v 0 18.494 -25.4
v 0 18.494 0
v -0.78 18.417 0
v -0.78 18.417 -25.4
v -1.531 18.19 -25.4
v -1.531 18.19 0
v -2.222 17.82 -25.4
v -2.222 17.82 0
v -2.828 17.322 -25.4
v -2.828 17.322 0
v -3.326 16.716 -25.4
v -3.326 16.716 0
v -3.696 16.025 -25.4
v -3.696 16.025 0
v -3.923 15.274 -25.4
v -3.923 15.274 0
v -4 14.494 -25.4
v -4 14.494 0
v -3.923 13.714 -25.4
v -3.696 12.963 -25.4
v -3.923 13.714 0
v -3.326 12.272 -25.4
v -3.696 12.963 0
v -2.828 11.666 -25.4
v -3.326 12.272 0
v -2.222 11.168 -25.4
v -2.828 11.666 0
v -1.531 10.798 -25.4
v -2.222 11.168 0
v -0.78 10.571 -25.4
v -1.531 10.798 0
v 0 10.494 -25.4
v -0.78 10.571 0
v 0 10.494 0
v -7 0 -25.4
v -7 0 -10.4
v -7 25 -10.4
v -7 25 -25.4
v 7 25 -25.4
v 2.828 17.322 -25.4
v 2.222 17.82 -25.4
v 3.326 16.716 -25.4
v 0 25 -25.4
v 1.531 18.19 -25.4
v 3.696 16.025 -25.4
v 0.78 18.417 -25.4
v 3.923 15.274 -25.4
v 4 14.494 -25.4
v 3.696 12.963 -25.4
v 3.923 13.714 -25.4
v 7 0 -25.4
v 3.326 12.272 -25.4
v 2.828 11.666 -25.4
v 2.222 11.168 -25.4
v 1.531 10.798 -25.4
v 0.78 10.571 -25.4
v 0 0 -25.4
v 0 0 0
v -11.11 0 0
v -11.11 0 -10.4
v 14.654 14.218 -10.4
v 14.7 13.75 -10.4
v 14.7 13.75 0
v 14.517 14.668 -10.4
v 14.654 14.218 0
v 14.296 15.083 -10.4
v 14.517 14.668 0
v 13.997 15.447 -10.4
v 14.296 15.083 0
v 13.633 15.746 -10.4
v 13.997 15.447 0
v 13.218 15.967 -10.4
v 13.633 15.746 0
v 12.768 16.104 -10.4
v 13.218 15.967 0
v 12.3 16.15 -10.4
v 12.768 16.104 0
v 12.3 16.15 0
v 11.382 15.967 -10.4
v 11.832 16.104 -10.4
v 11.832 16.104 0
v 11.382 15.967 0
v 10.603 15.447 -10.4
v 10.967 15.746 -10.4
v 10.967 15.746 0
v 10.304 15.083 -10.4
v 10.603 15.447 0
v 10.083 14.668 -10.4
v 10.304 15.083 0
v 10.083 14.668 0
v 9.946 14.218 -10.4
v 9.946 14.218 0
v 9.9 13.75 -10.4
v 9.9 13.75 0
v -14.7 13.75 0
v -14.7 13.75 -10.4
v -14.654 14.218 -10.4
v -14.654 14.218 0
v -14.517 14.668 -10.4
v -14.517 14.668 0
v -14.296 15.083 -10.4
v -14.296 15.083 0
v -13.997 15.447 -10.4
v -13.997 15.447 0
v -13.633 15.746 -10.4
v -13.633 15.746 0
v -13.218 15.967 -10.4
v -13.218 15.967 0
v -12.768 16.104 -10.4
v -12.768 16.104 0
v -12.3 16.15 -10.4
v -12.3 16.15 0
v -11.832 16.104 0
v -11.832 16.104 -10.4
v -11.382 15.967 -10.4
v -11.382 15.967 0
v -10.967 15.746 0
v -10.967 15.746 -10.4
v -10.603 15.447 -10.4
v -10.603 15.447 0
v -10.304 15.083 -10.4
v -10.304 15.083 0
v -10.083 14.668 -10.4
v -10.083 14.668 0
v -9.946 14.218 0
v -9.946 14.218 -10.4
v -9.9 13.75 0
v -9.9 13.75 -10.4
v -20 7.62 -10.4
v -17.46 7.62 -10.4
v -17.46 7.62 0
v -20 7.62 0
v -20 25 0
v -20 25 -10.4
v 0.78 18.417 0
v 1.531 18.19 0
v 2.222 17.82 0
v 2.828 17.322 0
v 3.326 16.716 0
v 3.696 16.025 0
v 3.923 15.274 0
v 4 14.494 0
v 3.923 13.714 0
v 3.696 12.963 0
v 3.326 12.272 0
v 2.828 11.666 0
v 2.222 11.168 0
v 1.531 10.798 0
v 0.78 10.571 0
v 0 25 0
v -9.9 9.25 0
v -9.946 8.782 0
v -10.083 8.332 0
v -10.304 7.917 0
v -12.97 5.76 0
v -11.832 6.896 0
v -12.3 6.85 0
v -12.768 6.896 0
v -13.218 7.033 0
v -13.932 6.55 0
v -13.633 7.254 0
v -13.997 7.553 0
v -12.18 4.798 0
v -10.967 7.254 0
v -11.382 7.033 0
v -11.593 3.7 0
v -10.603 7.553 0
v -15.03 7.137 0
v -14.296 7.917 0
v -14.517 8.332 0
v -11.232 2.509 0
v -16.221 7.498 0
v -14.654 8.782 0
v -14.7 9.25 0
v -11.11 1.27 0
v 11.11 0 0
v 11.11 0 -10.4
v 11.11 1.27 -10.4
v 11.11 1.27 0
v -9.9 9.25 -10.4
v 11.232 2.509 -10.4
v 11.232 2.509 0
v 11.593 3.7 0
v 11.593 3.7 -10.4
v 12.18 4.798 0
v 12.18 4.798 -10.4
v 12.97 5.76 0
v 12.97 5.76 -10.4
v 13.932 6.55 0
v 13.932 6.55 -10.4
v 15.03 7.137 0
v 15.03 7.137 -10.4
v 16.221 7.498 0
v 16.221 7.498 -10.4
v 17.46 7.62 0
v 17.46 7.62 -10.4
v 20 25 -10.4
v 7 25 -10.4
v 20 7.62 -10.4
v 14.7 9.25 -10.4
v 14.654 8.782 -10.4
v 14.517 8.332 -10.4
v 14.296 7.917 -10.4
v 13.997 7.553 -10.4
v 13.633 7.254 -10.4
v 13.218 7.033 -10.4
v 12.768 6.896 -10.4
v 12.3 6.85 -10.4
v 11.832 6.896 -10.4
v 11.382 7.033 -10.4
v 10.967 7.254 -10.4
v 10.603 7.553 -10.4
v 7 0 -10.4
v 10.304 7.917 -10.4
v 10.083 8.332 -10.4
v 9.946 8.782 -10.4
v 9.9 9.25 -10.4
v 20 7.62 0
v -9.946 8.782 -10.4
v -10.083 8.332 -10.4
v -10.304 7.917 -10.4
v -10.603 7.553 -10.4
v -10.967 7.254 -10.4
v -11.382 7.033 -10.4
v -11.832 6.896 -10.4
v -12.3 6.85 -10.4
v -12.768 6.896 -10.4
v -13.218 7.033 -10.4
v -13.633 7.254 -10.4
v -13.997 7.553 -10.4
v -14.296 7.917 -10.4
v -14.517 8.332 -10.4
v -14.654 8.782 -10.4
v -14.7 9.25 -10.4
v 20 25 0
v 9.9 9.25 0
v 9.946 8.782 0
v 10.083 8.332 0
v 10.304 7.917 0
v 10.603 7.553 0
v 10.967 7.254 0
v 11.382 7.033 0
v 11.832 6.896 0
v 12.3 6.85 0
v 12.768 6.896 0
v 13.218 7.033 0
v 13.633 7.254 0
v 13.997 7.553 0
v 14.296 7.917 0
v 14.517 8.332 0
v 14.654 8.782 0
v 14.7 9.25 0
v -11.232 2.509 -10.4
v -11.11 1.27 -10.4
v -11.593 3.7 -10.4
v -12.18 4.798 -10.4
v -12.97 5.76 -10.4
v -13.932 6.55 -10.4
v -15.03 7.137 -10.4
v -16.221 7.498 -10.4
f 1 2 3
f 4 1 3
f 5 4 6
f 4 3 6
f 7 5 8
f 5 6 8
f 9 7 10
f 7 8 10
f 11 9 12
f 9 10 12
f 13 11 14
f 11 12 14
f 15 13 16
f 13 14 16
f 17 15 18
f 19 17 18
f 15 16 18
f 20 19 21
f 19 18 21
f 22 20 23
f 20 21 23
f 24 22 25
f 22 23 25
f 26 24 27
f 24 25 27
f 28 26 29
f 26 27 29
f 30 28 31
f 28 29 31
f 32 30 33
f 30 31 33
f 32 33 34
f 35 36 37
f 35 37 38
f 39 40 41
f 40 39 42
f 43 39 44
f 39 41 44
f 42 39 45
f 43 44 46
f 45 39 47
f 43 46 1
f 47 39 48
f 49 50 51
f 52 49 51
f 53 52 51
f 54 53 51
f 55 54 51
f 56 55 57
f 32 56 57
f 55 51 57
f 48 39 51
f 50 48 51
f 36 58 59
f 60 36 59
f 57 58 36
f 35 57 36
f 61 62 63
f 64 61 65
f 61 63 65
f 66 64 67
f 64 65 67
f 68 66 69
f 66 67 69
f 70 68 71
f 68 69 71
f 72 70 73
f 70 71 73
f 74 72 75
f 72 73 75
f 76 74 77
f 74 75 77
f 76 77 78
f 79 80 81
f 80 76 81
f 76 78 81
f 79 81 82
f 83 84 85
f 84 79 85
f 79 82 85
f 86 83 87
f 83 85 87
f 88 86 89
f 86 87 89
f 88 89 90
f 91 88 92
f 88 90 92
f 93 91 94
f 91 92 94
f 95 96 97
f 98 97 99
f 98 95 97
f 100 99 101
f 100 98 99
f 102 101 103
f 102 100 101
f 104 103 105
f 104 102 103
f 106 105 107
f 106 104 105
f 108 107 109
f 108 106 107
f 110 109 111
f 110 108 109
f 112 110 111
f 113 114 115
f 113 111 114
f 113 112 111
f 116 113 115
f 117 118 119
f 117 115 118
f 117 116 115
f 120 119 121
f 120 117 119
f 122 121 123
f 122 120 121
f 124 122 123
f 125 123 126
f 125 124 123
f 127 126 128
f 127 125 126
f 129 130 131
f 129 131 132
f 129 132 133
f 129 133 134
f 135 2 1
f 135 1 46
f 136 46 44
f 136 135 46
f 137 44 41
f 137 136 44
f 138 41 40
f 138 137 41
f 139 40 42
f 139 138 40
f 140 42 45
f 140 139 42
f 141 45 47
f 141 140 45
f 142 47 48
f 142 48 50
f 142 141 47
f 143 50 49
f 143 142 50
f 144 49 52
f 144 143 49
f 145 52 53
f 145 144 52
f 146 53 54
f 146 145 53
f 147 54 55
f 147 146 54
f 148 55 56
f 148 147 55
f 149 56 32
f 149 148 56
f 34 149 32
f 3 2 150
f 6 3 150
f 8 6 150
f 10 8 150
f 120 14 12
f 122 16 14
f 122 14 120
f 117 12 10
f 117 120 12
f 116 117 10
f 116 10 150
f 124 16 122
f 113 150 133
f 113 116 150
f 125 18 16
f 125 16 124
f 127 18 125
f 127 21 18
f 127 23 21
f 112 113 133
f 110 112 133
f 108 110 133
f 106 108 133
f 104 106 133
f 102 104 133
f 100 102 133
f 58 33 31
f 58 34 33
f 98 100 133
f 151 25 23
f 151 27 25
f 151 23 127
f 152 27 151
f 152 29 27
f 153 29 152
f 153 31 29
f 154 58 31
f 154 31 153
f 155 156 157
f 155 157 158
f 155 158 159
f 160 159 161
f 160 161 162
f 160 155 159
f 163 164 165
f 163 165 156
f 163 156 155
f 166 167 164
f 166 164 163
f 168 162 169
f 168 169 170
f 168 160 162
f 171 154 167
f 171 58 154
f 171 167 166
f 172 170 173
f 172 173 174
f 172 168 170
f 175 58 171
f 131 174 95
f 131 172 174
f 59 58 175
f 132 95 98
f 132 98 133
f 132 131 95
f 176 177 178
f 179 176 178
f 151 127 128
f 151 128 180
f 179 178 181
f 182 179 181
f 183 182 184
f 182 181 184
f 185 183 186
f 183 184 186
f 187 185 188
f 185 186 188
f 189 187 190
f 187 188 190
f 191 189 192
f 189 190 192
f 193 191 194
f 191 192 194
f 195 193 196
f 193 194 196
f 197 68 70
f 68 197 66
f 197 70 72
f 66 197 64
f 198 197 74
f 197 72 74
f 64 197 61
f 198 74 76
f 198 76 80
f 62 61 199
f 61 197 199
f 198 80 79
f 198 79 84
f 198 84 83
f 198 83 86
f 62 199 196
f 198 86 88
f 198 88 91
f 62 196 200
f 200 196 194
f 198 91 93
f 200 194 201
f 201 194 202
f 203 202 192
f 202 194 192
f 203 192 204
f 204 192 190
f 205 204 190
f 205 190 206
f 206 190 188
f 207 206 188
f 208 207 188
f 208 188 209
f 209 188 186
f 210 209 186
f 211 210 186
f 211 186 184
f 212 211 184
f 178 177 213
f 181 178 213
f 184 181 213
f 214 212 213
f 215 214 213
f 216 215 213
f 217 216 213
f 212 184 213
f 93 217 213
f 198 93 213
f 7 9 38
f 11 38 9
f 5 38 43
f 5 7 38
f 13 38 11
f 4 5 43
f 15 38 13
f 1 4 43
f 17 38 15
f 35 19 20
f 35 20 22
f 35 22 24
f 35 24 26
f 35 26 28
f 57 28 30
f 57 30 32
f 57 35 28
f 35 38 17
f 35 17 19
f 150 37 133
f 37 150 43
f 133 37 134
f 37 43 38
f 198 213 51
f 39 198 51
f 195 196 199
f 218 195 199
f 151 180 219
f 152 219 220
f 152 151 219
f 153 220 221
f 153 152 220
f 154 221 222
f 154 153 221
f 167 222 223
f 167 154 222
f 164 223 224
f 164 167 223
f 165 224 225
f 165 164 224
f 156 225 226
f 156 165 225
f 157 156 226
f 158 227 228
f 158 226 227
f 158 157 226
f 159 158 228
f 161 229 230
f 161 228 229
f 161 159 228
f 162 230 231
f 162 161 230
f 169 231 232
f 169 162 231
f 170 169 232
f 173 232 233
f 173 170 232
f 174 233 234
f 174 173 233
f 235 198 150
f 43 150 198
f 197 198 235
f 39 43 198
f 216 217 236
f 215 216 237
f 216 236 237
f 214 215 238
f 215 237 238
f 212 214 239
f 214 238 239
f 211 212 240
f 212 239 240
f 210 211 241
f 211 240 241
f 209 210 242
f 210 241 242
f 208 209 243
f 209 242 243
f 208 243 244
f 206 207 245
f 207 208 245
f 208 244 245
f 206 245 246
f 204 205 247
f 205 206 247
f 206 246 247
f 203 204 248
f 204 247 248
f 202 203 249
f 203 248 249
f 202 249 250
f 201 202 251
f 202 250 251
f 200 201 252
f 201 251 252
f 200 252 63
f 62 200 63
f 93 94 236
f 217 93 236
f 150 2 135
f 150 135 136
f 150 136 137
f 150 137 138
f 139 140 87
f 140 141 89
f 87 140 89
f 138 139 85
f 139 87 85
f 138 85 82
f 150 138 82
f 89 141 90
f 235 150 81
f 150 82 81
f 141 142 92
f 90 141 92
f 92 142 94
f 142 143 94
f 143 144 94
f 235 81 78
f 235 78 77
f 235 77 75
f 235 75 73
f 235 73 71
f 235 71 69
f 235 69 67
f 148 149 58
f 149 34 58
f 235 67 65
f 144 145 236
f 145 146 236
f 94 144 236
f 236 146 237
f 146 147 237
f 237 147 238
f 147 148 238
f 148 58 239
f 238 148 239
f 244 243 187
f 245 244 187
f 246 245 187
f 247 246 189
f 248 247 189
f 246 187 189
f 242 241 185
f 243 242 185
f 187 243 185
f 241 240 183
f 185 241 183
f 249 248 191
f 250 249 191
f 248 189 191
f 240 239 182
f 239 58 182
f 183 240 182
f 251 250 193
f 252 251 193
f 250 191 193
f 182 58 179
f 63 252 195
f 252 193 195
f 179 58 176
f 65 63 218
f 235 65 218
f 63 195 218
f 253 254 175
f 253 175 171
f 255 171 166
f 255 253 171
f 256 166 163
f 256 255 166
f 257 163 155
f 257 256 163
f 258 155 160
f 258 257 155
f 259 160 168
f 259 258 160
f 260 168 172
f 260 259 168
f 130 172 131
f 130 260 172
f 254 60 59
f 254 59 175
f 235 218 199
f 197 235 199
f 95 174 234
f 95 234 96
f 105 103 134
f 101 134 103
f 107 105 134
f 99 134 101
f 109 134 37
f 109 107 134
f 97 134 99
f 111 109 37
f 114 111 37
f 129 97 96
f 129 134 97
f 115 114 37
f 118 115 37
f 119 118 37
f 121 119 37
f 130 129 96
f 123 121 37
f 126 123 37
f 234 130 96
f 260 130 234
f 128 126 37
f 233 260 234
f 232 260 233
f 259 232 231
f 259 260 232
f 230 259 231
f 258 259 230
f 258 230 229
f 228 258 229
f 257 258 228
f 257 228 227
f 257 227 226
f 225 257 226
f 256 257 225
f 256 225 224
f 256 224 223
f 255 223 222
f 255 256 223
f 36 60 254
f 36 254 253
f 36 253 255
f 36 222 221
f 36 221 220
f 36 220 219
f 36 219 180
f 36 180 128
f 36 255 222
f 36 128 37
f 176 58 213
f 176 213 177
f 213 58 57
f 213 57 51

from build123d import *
from build123d.topology import SkipClean

# Parameters (mm, degrees)
BOSS_EXTRUDE1_DEPTH = 25
CUT_EXTRUDE1_DEPTH  = 41.867591072
SKETCH8_R           = 4
CUT_EXTRUDE2_DEPTH  = 41.867591072
CUT_EXTRUDE3_DEPTH  = 36.355339059


with BuildPart() as part:
    # Sketch6 → Boss-Extrude1 (new body)
    with BuildSketch(Plane(origin=(0, 0, 0), x_dir=(1, 0, 0), z_dir=(0, 1, 0))):
        Polygon((0, 0), (-20, 0), (-20, 10.4), (-7, 10.4), (-7, 25.4), (0, 25.4), align=None)
    extrude(amount=BOSS_EXTRUDE1_DEPTH)

    # Sketch7 → Cut-Extrude1 (cut, through all)
    with BuildSketch(Plane.XY):
        with BuildLine():
            Line((-9.9, 13.75), (-9.9, 9.25))
            ThreePointArc((-9.9, 9.25), (-12.3, 6.85), (-14.7, 9.25))
            Line((-14.7, 9.25), (-14.7, 13.75))
            ThreePointArc((-14.7, 13.75), (-12.3, 16.15), (-9.9, 13.75))
        make_face()
    extrude(amount=-CUT_EXTRUDE1_DEPTH, mode=Mode.SUBTRACT)

    # Sketch8 → Cut-Extrude2 (cut, through all)
    with BuildSketch(Plane.XY):
        with Locations((0, 14.49399695)):
            Circle(SKETCH8_R)
    extrude(amount=-CUT_EXTRUDE2_DEPTH, mode=Mode.SUBTRACT)

    # Sketch9 → Cut-Extrude3 (cut, through all)
    with BuildSketch(Plane(origin=(0, 0, -10.4), x_dir=(-1, 0, 0), z_dir=(0, 0, -1))):
        with BuildLine():
            Line((11.11, 0), (11.11, 1.27))
            ThreePointArc((11.11, 1.27), (12.969871939, 5.760128061), (17.46, 7.62))
            Line((17.46, 7.62), (20, 7.62))
            Line((20, 7.62), (20, 0))
            Line((20, 0), (11.11, 0))
        make_face()
    extrude(amount=-CUT_EXTRUDE3_DEPTH, mode=Mode.SUBTRACT)

    # Mirror1: part across plane


with BuildPart() as part_1:
    with SkipClean():  # the faces are left unmerged after this step: merging them gives an invalid solid
        add(part.part)
        add(part.part.mirror(Plane(origin=(0, 0, 0), x_dir=(0, 0, 1), z_dir=(1, 0, 0))))


solid = part_1.part
